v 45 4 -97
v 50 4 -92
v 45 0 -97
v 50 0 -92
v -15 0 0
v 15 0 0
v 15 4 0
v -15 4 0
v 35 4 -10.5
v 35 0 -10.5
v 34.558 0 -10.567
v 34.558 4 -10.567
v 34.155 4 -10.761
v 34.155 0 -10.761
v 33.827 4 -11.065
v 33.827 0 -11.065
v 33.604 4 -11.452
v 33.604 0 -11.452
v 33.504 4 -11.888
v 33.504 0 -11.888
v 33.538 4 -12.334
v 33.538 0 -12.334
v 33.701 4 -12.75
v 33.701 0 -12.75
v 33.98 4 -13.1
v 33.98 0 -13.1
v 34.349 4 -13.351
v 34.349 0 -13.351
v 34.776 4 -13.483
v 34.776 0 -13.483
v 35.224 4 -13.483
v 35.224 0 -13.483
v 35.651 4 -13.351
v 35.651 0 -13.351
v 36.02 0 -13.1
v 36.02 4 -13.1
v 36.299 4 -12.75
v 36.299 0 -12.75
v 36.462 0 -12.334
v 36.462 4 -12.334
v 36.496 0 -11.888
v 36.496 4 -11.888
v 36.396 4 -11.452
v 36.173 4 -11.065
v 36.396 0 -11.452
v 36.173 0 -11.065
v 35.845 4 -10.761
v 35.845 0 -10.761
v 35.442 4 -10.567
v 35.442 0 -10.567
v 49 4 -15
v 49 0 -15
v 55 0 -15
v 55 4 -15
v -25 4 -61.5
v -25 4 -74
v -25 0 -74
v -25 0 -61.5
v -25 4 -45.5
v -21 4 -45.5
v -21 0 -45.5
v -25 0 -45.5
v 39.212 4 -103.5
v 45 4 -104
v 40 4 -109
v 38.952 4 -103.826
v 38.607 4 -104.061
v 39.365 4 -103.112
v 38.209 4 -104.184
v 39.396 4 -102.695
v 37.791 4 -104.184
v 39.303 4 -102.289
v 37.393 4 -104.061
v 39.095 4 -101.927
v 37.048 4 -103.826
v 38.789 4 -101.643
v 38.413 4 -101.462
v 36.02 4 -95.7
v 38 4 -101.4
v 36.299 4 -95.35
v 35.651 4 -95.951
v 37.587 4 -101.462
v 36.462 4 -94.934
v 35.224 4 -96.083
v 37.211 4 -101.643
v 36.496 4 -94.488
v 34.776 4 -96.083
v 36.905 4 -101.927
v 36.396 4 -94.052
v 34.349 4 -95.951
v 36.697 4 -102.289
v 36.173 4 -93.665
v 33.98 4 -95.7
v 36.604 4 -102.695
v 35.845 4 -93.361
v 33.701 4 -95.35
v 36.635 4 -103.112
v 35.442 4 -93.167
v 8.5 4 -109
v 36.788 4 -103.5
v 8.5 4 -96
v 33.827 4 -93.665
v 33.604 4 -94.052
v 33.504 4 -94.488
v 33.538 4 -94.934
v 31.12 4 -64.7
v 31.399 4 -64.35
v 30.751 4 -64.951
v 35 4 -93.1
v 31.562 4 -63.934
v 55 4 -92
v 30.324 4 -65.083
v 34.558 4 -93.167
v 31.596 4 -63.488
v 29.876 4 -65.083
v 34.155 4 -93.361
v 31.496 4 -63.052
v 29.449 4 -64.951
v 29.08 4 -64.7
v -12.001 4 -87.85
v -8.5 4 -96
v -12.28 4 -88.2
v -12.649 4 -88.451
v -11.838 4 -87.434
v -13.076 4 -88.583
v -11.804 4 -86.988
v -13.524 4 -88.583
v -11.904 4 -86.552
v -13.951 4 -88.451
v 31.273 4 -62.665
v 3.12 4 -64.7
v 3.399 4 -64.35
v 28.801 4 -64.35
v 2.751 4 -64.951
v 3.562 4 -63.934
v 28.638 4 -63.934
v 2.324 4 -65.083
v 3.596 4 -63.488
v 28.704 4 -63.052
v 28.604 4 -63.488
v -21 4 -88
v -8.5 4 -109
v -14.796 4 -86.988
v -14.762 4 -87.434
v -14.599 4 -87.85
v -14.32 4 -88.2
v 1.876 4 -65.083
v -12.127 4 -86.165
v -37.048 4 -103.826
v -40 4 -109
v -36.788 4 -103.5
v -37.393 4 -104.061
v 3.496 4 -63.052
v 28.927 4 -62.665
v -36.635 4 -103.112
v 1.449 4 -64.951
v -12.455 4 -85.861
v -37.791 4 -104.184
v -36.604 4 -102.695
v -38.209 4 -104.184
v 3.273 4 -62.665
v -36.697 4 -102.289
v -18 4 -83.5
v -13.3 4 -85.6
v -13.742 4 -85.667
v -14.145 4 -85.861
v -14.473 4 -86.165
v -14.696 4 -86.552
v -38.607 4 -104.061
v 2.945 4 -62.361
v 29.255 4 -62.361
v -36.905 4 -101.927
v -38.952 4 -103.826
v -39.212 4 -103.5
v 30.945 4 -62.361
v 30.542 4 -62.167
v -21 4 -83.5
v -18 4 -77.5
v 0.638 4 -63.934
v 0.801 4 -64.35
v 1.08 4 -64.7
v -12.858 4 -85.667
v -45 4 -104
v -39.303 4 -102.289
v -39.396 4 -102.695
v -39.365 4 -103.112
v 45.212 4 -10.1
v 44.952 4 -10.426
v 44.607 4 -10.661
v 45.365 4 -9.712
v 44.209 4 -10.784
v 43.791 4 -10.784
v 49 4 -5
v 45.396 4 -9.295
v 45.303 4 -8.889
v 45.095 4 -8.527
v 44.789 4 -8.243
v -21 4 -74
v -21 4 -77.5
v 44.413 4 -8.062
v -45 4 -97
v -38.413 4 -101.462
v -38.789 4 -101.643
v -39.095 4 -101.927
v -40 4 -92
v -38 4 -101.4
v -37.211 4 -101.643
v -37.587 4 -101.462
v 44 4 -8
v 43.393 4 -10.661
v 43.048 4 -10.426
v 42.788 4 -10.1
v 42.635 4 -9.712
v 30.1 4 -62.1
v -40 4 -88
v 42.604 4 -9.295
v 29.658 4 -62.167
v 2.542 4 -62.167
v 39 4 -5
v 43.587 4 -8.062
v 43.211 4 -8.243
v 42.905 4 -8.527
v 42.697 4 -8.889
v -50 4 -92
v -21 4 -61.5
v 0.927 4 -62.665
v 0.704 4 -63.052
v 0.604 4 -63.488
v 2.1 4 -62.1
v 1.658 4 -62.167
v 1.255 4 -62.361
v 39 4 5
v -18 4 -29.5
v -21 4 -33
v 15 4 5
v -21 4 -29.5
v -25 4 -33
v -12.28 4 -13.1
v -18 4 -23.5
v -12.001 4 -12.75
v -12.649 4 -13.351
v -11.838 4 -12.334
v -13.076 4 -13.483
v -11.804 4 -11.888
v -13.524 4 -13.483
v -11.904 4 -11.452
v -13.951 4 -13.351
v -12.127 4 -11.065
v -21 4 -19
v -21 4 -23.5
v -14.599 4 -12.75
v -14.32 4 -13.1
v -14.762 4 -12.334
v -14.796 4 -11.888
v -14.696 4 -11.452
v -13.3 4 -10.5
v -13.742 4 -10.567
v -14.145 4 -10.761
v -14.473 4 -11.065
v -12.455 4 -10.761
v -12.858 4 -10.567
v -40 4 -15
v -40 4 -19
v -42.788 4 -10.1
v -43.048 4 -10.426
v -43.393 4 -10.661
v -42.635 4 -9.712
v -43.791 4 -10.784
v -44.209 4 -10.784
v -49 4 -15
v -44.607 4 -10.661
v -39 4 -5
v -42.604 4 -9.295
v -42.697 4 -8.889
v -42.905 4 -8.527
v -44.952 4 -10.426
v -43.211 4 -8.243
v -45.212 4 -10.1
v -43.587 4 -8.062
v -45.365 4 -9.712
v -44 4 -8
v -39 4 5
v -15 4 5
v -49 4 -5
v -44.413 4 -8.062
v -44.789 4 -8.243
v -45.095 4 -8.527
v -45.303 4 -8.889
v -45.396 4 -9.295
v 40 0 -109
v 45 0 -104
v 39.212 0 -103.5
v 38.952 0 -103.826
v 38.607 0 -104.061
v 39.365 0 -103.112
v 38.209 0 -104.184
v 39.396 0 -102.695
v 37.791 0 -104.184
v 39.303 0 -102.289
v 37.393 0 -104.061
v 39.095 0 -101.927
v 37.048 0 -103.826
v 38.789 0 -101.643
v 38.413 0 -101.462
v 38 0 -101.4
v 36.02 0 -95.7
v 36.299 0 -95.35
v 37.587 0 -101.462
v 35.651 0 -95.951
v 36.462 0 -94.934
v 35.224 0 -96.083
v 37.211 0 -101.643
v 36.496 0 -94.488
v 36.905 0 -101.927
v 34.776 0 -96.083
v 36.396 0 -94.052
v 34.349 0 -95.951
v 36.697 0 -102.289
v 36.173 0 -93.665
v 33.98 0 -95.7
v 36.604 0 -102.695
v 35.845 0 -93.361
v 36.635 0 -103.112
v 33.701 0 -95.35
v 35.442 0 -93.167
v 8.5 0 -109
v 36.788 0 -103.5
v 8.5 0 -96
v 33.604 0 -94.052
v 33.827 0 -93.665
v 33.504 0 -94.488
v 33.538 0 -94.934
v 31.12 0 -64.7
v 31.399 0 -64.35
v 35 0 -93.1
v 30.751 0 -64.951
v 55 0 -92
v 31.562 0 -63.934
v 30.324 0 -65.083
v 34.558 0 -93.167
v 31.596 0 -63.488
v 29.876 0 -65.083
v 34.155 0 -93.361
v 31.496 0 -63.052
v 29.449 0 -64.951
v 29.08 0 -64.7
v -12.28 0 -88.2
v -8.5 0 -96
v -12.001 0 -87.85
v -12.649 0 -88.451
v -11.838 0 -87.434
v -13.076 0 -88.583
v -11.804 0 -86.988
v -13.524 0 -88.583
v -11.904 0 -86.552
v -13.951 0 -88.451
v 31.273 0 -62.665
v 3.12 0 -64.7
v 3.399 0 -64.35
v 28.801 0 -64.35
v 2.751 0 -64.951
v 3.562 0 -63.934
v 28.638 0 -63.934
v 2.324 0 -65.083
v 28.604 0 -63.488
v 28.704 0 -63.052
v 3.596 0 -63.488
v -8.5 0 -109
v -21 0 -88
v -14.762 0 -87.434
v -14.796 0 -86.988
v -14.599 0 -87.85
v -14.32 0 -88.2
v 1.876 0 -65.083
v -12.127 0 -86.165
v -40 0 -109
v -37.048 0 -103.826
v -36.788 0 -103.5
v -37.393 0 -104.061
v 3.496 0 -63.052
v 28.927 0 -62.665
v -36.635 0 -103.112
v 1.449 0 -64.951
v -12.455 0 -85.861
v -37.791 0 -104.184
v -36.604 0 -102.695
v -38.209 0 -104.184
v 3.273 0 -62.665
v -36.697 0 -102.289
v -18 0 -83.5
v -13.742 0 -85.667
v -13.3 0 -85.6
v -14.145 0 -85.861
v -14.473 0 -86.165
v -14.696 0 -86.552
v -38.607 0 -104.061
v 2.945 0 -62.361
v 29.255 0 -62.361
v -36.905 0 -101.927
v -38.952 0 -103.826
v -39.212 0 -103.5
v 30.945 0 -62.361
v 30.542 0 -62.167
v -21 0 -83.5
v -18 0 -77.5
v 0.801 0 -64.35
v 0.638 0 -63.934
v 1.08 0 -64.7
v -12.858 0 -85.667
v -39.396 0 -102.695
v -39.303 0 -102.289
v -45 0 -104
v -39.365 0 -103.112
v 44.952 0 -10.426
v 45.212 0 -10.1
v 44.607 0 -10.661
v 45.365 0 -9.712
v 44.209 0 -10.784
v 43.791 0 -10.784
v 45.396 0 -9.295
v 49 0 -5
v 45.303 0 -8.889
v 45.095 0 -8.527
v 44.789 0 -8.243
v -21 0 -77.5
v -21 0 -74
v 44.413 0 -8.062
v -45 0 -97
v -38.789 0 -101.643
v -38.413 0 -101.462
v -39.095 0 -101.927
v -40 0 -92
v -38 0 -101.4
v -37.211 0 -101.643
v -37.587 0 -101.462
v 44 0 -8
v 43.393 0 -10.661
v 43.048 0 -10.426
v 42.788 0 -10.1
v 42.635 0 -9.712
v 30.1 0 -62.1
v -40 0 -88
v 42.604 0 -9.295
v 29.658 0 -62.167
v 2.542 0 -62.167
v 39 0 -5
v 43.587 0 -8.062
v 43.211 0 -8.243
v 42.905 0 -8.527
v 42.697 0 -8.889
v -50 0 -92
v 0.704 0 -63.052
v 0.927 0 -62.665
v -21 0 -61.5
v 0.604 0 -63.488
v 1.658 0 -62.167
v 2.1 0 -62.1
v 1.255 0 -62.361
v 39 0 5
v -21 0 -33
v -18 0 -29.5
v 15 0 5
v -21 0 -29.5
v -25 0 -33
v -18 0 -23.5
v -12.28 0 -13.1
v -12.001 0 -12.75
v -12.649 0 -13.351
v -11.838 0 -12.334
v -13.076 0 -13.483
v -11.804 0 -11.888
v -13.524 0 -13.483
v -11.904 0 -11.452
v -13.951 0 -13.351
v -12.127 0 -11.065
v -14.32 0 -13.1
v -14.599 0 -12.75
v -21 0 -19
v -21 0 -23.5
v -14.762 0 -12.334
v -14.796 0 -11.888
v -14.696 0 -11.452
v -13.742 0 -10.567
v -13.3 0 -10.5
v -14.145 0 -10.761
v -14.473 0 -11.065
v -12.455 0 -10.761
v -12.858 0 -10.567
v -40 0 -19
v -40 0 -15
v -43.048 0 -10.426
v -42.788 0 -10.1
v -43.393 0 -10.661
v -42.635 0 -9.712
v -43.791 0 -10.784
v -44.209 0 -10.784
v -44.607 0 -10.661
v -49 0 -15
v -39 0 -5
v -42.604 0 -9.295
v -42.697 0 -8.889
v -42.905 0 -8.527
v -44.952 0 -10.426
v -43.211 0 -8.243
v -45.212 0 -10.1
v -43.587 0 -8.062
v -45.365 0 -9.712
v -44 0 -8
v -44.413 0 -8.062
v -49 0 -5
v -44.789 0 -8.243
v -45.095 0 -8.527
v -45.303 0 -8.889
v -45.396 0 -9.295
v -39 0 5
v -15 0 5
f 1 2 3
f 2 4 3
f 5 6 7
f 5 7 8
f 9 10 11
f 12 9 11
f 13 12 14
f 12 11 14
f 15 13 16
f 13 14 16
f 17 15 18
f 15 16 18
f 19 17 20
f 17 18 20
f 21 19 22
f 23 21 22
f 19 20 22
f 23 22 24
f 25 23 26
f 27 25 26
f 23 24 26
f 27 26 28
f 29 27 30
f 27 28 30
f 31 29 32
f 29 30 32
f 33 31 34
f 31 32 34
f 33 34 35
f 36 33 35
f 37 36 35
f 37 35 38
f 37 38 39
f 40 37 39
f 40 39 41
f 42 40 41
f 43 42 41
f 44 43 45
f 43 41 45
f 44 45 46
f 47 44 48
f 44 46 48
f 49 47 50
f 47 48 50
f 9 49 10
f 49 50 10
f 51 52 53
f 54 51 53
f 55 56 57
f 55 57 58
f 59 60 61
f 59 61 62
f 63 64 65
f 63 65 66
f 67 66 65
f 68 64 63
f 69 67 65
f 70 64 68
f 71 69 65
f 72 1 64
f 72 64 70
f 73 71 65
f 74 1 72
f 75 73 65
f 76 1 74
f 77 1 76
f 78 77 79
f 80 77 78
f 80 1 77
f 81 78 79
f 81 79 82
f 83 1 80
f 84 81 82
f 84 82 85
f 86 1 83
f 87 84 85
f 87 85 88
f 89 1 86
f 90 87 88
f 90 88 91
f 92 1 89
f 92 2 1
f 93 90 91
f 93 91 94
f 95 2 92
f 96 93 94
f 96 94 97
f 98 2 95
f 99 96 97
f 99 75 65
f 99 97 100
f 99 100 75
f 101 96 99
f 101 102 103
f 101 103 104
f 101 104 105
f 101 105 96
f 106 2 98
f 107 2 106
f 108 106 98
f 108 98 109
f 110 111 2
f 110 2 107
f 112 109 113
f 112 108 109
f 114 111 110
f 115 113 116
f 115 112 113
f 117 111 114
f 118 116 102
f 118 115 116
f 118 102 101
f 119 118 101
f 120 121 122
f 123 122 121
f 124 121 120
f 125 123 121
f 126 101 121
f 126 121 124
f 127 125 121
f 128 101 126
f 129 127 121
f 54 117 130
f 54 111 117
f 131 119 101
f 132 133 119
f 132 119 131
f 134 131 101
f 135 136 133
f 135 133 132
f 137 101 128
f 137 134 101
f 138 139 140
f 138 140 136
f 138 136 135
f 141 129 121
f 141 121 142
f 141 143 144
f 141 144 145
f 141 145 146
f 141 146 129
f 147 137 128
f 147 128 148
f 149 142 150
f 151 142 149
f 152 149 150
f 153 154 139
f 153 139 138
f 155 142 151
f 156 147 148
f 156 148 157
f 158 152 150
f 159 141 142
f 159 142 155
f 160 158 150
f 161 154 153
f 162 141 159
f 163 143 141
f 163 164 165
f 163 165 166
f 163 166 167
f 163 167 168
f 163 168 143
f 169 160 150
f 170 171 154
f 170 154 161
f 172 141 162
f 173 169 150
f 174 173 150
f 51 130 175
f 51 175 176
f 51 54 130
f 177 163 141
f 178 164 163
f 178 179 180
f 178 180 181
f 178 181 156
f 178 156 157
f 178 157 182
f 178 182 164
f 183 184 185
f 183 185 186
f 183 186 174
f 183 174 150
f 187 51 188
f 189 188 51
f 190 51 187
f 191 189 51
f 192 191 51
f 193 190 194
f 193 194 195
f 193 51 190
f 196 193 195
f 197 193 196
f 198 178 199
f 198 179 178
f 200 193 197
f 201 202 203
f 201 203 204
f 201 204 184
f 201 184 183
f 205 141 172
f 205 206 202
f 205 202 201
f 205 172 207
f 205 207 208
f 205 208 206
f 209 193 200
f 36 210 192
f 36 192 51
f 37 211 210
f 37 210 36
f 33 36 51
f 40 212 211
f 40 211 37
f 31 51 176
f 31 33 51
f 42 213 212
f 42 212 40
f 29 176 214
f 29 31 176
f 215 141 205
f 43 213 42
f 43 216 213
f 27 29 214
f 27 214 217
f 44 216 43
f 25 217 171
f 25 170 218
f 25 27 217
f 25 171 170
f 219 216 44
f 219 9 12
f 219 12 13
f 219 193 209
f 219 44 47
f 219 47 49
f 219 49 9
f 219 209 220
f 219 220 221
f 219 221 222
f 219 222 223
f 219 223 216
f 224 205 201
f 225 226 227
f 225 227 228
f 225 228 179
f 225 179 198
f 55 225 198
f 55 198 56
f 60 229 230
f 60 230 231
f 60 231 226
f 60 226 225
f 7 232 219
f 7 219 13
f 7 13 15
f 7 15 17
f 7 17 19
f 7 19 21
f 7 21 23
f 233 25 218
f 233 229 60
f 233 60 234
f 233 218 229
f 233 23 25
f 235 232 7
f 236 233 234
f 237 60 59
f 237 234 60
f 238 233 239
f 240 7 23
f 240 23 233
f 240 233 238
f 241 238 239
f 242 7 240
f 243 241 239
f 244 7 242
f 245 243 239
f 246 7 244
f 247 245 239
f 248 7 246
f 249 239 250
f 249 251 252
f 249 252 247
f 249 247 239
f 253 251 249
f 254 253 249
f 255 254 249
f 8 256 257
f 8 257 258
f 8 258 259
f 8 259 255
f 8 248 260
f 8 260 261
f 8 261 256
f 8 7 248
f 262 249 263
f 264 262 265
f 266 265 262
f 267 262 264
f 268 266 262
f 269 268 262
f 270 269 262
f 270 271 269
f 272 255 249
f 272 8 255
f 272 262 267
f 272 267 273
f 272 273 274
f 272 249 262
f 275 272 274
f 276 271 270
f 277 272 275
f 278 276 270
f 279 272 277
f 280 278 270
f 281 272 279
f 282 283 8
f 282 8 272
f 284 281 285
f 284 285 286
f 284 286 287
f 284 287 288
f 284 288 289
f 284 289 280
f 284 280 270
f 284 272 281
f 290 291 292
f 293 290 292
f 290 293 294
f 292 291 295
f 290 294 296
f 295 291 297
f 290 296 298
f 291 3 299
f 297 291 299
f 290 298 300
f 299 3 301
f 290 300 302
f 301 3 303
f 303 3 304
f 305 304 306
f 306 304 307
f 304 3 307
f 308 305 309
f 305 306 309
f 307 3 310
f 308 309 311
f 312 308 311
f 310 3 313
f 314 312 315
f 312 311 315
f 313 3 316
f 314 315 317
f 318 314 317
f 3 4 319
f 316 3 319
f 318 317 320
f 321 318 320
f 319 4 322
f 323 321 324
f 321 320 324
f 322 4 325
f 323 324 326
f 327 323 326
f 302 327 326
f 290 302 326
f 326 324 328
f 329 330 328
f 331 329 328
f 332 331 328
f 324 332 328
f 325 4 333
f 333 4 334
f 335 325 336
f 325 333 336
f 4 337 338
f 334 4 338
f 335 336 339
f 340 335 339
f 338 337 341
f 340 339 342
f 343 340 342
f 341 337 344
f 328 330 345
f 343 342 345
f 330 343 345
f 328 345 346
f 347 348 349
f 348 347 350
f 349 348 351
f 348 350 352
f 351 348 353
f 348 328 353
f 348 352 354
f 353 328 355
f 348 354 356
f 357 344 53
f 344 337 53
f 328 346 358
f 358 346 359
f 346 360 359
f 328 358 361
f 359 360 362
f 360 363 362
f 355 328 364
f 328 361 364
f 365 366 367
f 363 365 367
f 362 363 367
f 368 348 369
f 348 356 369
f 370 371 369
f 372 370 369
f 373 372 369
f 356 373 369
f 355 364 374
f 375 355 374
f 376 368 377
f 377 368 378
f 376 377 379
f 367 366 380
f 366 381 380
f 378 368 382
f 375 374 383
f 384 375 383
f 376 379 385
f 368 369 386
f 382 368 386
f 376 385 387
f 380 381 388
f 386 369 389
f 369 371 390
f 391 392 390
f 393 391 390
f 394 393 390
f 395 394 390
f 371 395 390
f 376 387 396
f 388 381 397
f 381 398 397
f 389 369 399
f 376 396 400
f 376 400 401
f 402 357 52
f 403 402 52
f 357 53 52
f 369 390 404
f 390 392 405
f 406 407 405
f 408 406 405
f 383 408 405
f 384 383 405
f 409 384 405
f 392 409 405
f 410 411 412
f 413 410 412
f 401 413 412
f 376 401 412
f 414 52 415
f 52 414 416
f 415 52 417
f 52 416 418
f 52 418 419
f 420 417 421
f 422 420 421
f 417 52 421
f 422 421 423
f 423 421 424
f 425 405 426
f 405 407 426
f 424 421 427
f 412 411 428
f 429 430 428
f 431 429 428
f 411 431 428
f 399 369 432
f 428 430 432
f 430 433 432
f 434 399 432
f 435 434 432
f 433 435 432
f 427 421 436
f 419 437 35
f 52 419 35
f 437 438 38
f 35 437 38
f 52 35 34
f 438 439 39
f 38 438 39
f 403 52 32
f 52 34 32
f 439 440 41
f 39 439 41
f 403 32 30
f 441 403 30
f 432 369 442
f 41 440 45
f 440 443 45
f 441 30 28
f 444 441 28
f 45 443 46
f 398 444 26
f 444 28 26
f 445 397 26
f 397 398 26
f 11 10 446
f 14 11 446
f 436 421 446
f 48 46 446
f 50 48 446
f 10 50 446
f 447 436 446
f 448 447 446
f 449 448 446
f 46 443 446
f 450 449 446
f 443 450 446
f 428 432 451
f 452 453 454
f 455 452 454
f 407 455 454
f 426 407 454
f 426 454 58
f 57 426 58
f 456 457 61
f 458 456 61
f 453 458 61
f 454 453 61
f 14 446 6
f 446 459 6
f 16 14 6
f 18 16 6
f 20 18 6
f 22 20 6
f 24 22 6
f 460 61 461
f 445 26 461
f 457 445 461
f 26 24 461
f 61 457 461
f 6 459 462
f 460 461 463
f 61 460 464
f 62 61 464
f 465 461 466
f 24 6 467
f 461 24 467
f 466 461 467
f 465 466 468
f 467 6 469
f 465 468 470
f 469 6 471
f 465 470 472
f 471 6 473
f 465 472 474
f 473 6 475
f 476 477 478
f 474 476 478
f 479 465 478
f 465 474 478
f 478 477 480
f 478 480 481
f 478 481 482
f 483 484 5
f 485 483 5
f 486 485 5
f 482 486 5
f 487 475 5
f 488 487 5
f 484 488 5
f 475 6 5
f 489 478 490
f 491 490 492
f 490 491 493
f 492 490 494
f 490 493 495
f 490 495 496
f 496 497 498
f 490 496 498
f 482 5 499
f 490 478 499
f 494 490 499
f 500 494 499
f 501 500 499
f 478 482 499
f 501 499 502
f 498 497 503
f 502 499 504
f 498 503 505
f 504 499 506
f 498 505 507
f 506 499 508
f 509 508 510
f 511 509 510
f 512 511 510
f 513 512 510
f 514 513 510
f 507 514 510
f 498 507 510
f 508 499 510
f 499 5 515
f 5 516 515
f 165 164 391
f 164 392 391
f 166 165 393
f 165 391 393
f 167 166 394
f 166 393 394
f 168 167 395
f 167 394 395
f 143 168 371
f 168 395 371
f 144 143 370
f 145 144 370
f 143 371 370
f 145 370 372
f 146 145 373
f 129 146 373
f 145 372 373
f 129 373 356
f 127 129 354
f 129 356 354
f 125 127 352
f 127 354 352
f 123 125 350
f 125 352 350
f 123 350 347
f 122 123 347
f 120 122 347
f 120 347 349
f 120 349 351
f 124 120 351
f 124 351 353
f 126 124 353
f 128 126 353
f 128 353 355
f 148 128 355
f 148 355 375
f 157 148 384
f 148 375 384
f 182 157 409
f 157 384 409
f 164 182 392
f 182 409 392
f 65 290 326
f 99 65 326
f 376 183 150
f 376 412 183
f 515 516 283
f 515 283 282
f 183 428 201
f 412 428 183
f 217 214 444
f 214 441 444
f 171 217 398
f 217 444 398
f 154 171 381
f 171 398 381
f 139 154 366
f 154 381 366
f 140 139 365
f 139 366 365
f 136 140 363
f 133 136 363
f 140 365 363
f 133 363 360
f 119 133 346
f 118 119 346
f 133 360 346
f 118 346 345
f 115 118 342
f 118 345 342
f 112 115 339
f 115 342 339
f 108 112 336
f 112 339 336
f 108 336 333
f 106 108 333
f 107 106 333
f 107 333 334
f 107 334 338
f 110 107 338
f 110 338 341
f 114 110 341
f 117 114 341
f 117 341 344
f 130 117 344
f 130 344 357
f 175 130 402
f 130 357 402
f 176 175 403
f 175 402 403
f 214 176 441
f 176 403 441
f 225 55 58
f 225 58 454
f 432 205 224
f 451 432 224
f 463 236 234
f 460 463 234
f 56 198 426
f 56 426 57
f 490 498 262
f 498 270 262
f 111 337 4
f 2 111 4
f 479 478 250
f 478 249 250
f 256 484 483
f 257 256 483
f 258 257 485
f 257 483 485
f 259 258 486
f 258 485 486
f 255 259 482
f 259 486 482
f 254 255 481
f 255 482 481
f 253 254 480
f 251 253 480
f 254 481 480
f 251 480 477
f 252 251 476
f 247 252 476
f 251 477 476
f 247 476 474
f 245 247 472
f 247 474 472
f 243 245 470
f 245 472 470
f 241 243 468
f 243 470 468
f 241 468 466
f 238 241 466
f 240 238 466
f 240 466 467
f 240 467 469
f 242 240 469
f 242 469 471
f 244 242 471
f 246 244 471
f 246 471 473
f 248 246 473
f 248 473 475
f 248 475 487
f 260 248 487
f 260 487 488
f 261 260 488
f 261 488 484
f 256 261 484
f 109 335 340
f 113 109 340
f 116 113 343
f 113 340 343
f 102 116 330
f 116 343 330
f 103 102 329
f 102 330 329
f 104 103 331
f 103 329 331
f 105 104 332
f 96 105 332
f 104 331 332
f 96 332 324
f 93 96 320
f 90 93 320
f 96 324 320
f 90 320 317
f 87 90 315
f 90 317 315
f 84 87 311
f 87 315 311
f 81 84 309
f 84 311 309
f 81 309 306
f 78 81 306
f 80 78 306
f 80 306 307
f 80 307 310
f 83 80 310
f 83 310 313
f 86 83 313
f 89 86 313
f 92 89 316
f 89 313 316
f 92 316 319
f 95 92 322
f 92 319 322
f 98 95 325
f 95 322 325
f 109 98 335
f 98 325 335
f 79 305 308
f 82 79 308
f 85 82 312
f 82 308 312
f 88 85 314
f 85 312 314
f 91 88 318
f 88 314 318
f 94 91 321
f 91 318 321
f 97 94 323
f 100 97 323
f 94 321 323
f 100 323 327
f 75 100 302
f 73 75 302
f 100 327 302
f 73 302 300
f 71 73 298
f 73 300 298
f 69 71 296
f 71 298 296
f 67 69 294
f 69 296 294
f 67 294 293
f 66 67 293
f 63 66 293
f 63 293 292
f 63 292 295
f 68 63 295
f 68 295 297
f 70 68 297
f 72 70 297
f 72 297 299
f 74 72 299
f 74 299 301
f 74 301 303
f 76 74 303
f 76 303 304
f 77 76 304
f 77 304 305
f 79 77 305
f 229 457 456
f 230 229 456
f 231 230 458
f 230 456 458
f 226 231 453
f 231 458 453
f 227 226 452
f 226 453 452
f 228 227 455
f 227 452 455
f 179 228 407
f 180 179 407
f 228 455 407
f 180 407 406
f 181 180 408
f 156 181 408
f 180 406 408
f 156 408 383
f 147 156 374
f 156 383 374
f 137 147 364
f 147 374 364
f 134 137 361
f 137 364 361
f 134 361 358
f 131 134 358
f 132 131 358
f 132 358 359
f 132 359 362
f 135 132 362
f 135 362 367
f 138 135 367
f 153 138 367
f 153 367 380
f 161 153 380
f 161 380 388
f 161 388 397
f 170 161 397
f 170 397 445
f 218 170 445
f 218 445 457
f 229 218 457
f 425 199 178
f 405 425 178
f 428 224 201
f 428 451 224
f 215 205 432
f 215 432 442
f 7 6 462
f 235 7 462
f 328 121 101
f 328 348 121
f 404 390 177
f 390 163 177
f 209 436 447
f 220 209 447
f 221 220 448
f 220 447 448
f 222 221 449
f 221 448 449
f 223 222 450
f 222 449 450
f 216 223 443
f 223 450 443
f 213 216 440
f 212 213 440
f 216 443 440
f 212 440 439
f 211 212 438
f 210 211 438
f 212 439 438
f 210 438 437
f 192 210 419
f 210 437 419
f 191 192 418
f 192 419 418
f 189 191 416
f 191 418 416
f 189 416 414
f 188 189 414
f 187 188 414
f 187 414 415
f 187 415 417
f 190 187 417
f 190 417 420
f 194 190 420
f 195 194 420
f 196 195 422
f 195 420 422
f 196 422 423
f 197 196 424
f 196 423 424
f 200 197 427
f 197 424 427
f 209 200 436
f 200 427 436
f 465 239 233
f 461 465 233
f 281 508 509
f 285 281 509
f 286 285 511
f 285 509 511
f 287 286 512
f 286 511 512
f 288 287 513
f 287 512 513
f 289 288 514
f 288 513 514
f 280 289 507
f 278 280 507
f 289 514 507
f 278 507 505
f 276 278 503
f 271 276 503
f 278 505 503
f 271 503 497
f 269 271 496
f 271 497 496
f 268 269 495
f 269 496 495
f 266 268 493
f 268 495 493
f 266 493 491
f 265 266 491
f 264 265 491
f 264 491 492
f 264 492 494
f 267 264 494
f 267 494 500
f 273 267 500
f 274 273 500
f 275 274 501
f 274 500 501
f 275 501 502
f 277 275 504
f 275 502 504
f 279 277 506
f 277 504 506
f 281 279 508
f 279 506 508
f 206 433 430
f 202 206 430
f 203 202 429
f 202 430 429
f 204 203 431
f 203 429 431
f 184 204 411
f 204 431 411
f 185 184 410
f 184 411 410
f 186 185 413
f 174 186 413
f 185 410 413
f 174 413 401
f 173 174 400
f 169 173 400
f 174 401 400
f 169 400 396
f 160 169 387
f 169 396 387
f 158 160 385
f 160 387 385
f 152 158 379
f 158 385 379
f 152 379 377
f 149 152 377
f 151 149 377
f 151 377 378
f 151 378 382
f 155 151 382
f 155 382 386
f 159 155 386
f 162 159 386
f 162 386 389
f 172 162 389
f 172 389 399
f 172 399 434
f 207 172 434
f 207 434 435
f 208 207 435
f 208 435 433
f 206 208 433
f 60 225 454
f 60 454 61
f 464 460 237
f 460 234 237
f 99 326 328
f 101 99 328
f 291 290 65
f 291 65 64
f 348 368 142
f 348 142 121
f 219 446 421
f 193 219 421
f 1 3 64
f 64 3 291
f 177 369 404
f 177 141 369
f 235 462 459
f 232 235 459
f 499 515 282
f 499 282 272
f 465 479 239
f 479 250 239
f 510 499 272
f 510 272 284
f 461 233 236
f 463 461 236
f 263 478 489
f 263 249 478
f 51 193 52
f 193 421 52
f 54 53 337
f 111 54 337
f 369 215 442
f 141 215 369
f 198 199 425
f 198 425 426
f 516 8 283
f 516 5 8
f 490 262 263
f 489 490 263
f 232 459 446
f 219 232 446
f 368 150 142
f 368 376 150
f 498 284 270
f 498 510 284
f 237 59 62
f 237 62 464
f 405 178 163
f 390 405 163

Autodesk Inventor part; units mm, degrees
ref_plane "YZ Plane" through (0, 0, 0) normal (1, 0, 0) x (0, 1, 0)
ref_plane "XZ Plane" through (0, 0, 0) normal (0, 1, 0) x (-1, 0, 0)
ref_plane "XY Plane" through (0, 0, 0) normal (0, 0, 1) x (1, 0, 0)
sketch "Эскиз1" plane through (0, 0, 0) normal (0, 1, 0) x (-1, 0, 0)
  line L0 (0, 0) -> (0, -96)
  line L1 (0, 0) -> (15, 0)
  line L2 (15, 0) -> (15, 5)
  line L3 (15, 5) -> (39, 5)
  line L4 (39, 5) -> (39, -5)
  line L5 (39, -5) -> (49, -5)
  line L6 (49, -5) -> (49, -15)
  line L7 (49, -15) -> (55, -15)
  line L8 (55, -15) -> (55, -92)
  line L9 (55, -92) -> (50, -92)
  line L10 (50, -92) -> (45, -97)
  line L11 (45, -97) -> (45, -104)
  line L12 (0, 0) -> (-15, 0)
  line L13 (-15, 0) -> (-15, 5)
  line L14 (-15, 5) -> (-39, 5)
  line L15 (-39, 5) -> (-39, -5)
  line L16 (-39, -5) -> (-49, -5)
  line L17 (-49, -5) -> (-49, -15)
  line L18 (-49, -15) -> (-55, -15)
  line L19 (-55, -15) -> (-55, -92)
  line L20 (-55, -92) -> (-50, -92)
  line L21 (-50, -92) -> (-45, -97)
  line L22 (-45, -97) -> (-45, -104)
  line L23 (45, -104) -> (40, -109)
  line L24 (-40, -109) -> (-45, -104)
  line L25 (40, -109) -> (8.5, -109)
  line L26 (8.5, -109) -> (8.5, -96)
  line L27 (8.5, -96) -> (0, -96)
  line L28 (-40, -109) -> (-8.5, -109)
  line L29 (-8.5, -109) -> (-8.5, -96)
  line L30 (-8.5, -96) -> (0, -96)
  point P0 (45, -109)
  point P1 (-45, -109)
  dimension "d0" = 30
  dimension "d1" = 78
  dimension "d2" = 10
  dimension "d3" = 10
  dimension "d4" = 10
  dimension "d5" = 6
  dimension "d6" = 97
  dimension "d7" = 100
  dimension "d8" = 45
  dimension "d10" = 5
  dimension "d11" = 12
  dimension "d26" = 5
  dimension "d27" = 5
  dimension "d28" = 5
  dimension "d29" = 5
  dimension "d30" = 114
  dimension "d31" = 135
  dimension "d32" = 17
  dimension "d33" = 13
extrude "Выдавливание1" add sketch "Эскиз1" along normal blind 4
sketch "Эскиз2" plane through (0, 4, 0) normal (0, 1, 0) x (1, 0, 0)
  line L0 (0, 0) -> (0, 94.8396)
  line L1 (49, 5) -> (49, 15) projected
  line L2 (39, 5) -> (49, 5) projected
  line L3 (-39, -5) -> (-15, -5) projected
  line L4 (55, 15) -> (55, 92) projected
  line L5 (55, 92) -> (50, 92) projected
  line L6 (-55, 92) -> (-55, 15) projected
  line L7 (-55, 15) -> (-49, 15) projected
  point P0 (-38, 102.8)
  point P1 (38, 102.8)
  point P2 (44, 9.4)
  point P3 (-44, 9.4)
  dimension "d21" = 5
  dimension "d22" = 4.4
  dimension "d24" = 107.8
  dimension "d25" = 76
hole "Отверстие1" at (-38, 4, -102.8) at (38, 4, -102.8) at (44, 4, -9.4) at (-44, 4, -9.4) direction (0, -1, 0) diameter 2.8 end through all
sketch "Эскиз4" plane through (0, 4, 0) normal (0, 1, 0) x (1, 0, 0)
  line L0 (-55, 92) -> (-55, 15) projected
  line L1 (-55, 88) -> (-25, 88)
  line L2 (-25, 88) -> (-25, 19)
  line L3 (-25, 19) -> (-55, 19)
  line L4 (-55, 19) -> (-55, 88)
  line L5 (-25, 88) -> (-21, 88)
  line L6 (-21, 88) -> (-21, 74)
  line L7 (-21, 74) -> (-25, 74)
  line L8 (-25, 61.5) -> (-21, 61.5)
  line L9 (-21, 61.5) -> (-21, 45.5)
  line L10 (-21, 45.5) -> (-25, 45.5)
  line L11 (-55, 53.5) -> (-25, 53.5) construction
  line L12 (-25, 19) -> (-21, 19)
  line L13 (-21, 19) -> (-21, 33)
  line L14 (-21, 33) -> (-25, 33)
  line L15 (-25, 33) -> (-25, 19)
  line L16 (-50, 92) -> (-55, 92) projected
  line L17 (-55, 92) -> (-40, 92)
  line L18 (-40, 92) -> (-40, 88)
  line L19 (-40, 88) -> (-55, 88)
  line L20 (-55, 88) -> (-55, 92)
  line L21 (-55, 15) -> (-40, 15)
  line L22 (-40, 15) -> (-40, 19)
  line L23 (-40, 19) -> (-55, 19)
  line L24 (-55, 19) -> (-55, 15)
  line L25 (-21, 23.5) -> (-18, 23.5)
  line L26 (-18, 23.5) -> (-18, 29.5)
  line L27 (-18, 29.5) -> (-21, 29.5)
  line L28 (-21, 29.5) -> (-21, 23.5)
  line L29 (-21, 77.5) -> (-18, 77.5)
  line L30 (-18, 77.5) -> (-18, 83.5)
  line L31 (-18, 83.5) -> (-21, 83.5)
  line L32 (-21, 83.5) -> (-21, 77.5)
  point P0 (0, 0)
  point P1 (-21, 53.5)
  point P2 (-18, 80.5)
  point P3 (-18, 26.5)
  dimension "d48" = 30
  dimension "d50" = 14
  dimension "d51" = 16
  dimension "d52" = 4
  dimension "d55" = 4
  dimension "d56" = 15
  dimension "d57" = 54
  dimension "d58" = 6
  dimension "d59" = 3
extrude "Выдавливание2" cut sketch "Эскиз4" against normal through all
sketch "Эскиз5" plane through (0, 4, 0) normal (0, 1, 0) x (1, 0, 0)
  line L0 (55, 15) -> (55, 92) projected
  line L1 (15, -5) -> (39, -5) projected
  point P0 (0, 0)
  point P1 (-13.3, 12)
  point P2 (35, 12)
  point P3 (35, 94.6)
  point P4 (-13.3, 87.1)
  point P5 (2.1, 63.6)
  point P6 (30.1, 63.6)
  dimension "d67" = 48.3
  dimension "d68" = 82.6
  dimension "d69" = 75.1
  dimension "d70" = 28
  dimension "d71" = 4.9
  dimension "d72" = 20
  dimension "d73" = 17
  dimension "d74" = 51.6
hole "Отверстие2" at (-13.3, 4, -12) at (35, 4, -12) at (35, 4, -94.6) at (-13.3, 4, -87.1) at (2.1, 4, -63.6) at (30.1, 4, -63.6) direction (0, -1, 0) diameter 3 end through all
equation "\"d27\" = d26"
equation "\"d28\" = d26"
equation "\"d29\" = d28"
properties part number "ElectronicPlate"
